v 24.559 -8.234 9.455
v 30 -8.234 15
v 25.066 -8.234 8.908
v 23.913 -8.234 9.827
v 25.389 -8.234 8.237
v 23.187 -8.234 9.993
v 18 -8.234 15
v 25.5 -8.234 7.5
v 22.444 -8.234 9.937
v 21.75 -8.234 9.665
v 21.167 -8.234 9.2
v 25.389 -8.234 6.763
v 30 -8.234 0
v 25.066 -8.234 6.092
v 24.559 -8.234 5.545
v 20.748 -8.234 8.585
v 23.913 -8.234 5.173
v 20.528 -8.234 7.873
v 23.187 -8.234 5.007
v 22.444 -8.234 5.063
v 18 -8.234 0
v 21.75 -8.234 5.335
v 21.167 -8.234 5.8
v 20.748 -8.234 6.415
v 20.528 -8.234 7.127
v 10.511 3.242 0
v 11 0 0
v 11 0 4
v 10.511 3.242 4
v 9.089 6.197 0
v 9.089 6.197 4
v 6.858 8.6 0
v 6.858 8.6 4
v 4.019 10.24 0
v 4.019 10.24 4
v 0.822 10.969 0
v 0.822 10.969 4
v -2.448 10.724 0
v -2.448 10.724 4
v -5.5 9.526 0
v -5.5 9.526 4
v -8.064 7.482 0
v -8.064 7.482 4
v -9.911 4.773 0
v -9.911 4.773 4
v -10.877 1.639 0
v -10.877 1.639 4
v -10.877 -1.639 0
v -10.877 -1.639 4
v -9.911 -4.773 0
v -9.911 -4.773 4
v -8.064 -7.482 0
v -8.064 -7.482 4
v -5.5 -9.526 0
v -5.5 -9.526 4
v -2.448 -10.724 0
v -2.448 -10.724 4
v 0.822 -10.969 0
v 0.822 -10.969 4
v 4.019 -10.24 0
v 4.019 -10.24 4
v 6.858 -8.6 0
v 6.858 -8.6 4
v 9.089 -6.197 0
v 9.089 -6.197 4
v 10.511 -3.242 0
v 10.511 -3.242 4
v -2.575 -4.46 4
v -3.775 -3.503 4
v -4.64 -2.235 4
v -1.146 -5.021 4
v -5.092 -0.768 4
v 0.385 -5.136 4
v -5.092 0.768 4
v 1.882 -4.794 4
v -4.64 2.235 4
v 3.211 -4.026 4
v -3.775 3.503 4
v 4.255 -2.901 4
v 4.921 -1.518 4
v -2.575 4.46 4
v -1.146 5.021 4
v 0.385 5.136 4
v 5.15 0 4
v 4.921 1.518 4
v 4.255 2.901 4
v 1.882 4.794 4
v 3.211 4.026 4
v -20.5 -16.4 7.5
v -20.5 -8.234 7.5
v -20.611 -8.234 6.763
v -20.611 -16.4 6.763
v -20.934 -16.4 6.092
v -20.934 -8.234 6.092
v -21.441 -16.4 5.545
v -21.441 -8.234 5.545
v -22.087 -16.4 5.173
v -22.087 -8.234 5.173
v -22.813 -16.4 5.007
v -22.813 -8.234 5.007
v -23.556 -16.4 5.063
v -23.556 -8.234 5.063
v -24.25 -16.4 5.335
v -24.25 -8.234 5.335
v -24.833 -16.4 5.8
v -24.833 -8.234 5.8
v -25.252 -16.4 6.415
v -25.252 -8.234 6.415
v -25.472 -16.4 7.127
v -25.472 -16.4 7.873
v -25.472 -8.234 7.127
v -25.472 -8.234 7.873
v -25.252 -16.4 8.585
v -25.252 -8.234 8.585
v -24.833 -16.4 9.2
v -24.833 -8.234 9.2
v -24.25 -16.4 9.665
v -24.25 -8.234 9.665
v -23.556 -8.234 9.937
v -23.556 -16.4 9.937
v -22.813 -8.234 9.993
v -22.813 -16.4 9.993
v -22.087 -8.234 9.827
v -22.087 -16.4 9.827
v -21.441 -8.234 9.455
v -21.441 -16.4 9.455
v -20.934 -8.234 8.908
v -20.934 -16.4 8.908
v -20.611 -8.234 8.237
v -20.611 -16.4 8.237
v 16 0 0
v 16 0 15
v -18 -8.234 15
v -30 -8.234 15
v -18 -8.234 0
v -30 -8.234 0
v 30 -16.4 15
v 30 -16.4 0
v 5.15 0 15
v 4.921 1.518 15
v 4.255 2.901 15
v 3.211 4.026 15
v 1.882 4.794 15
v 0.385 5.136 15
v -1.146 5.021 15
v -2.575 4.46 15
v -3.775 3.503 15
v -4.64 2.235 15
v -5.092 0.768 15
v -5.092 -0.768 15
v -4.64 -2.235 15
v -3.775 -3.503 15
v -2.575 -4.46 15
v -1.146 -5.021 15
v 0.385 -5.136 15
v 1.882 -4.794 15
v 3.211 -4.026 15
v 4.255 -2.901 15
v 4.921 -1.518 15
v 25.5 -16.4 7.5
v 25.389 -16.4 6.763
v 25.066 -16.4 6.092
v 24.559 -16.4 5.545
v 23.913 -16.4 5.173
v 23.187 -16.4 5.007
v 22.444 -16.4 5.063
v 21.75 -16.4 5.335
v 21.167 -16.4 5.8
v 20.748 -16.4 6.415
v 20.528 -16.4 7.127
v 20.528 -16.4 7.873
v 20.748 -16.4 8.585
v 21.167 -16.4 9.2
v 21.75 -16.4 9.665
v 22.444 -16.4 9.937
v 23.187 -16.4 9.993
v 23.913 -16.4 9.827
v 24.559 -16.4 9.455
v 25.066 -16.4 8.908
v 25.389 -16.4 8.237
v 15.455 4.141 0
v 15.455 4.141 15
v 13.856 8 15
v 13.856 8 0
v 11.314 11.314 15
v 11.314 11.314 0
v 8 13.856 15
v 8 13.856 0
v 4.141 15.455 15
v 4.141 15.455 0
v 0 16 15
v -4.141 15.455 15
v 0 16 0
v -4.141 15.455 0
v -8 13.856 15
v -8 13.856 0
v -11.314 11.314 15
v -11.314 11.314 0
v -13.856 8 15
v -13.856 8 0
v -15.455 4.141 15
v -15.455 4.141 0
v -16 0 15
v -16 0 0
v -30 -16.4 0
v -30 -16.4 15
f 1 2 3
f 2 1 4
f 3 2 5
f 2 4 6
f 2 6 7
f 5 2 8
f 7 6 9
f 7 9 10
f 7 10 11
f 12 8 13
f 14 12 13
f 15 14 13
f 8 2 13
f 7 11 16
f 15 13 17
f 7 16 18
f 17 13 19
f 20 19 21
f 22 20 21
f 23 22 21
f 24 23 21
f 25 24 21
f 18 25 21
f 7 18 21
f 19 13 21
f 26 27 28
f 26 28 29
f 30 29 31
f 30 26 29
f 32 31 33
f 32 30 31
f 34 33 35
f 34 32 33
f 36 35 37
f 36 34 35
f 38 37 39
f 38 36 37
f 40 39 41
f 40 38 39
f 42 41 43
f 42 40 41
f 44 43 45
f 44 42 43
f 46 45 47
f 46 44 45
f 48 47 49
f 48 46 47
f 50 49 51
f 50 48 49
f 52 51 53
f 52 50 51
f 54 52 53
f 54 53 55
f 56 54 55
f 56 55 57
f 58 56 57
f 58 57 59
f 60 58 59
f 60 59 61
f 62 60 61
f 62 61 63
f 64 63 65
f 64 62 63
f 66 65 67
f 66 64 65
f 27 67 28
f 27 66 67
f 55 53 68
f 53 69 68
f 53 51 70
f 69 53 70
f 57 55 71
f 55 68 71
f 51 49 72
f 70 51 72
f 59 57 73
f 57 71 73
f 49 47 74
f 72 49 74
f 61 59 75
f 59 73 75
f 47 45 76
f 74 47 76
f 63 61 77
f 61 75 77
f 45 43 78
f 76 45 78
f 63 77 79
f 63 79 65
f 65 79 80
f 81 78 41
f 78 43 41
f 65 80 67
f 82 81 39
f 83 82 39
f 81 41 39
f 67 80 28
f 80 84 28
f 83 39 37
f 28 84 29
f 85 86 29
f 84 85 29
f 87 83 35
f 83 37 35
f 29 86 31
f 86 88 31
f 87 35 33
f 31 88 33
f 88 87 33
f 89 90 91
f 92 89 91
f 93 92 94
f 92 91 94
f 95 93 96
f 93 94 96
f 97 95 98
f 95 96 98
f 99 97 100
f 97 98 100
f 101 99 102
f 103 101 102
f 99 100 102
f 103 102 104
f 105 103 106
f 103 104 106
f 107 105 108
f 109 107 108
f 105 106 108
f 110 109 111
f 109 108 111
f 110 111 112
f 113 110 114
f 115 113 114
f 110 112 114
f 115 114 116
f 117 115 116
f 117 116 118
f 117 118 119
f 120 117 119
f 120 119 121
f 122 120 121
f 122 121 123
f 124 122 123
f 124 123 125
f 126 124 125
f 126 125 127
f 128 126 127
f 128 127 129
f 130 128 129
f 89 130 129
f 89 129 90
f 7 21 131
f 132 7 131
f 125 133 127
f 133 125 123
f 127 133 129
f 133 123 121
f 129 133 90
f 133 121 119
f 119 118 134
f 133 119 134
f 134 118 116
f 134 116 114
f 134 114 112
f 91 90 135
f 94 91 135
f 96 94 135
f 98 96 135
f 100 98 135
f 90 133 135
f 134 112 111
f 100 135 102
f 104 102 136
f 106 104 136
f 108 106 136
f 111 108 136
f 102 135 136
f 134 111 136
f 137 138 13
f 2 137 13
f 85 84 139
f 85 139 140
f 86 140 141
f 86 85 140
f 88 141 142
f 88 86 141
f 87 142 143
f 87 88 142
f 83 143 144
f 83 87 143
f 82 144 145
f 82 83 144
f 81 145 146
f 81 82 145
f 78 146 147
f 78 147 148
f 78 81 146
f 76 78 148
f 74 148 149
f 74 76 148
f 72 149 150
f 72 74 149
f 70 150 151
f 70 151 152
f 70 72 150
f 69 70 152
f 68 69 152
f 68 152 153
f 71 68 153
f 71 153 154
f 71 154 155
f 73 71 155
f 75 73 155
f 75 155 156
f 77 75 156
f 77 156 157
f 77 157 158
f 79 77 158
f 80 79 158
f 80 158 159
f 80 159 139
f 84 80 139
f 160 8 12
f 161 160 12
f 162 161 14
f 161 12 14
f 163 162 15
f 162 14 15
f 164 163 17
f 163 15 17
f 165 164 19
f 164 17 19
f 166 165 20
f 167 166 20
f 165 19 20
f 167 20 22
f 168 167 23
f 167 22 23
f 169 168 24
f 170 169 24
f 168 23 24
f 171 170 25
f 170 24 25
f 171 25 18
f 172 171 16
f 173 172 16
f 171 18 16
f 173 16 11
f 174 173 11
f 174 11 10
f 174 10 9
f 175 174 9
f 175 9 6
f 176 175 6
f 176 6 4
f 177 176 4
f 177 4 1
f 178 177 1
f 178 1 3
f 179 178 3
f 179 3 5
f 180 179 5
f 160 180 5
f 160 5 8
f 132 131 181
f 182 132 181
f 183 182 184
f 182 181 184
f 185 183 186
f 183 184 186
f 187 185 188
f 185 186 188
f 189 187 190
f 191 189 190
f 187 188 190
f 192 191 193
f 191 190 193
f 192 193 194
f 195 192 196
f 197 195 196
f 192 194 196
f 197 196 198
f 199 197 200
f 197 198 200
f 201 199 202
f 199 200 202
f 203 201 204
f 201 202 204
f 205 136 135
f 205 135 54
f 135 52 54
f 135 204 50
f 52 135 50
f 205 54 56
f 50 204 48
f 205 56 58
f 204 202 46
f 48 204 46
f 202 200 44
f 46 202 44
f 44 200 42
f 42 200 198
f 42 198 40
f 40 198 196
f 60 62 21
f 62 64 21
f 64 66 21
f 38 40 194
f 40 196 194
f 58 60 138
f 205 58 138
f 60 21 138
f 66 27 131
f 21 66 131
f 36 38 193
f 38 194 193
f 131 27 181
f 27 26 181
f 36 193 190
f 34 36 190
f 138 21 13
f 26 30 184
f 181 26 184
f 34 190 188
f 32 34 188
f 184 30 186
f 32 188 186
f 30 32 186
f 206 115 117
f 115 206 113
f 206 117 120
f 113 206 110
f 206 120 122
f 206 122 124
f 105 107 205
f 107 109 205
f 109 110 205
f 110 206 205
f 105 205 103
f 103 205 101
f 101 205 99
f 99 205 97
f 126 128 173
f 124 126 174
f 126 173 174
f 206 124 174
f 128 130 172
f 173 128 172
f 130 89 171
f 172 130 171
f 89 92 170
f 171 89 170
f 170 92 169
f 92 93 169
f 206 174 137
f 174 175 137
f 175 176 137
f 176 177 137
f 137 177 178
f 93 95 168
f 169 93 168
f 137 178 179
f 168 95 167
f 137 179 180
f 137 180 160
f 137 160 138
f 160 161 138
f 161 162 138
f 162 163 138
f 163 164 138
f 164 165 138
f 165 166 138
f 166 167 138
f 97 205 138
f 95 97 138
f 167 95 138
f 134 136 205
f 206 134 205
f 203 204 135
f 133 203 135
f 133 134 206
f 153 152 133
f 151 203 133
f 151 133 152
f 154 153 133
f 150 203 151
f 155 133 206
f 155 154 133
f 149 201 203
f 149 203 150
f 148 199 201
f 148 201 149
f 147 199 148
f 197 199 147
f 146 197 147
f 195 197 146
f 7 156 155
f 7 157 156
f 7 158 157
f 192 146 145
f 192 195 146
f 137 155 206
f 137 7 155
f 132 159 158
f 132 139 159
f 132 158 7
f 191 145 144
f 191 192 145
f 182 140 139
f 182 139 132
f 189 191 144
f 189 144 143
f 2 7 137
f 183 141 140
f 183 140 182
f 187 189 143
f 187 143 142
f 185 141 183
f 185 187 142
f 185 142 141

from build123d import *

# Parameters (mm, degrees)
SKETCH2_R           = 5.15
BOSS_EXTRUDE1_DEPTH = 15
SKETCH3_R           = 11
CUT_EXTRUDE1_DEPTH  = 4
SKETCH4_R           = 2.5
CUT_EXTRUDE2_DEPTH  = 9.165533085


with BuildPart() as part:
    # Sketch2 → Boss-Extrude1 (new body)
    with BuildSketch(Plane.XY):
        with BuildLine():
            Line((-16, 0), (-18, -8.234466915))
            Line((-18, -8.234466915), (-30, -8.234466915))
            Line((-30, -8.234466915), (-30, -16.4))
            Line((-30, -16.4), (30, -16.4))
            Line((30, -16.4), (30, -8.234466915))
            Line((30, -8.234466915), (18, -8.234466915))
            Line((18, -8.234466915), (16, 0))
            ThreePointArc((16, 0), (0, 16), (-16, 0))
        make_face()
        Circle(SKETCH2_R, mode=Mode.SUBTRACT)
    extrude(amount=BOSS_EXTRUDE1_DEPTH)

    # Sketch3 → Cut-Extrude1 (cut)
    with BuildSketch(Plane.XY):
        Circle(SKETCH3_R)
    extrude(amount=CUT_EXTRUDE1_DEPTH, mode=Mode.SUBTRACT)

    # Sketch4 → Cut-Extrude2 (cut, through all)
    with BuildSketch(Plane(origin=(0, -8.234466915, 0), x_dir=(1, 0, 0), z_dir=(0, 1, 0))):
        with Locations((-23, -7.5)):
            Circle(SKETCH4_R)
        with Locations((23, -7.5)):
            Circle(SKETCH4_R)
    extrude(amount=-CUT_EXTRUDE2_DEPTH, mode=Mode.SUBTRACT)


solid = part.part
